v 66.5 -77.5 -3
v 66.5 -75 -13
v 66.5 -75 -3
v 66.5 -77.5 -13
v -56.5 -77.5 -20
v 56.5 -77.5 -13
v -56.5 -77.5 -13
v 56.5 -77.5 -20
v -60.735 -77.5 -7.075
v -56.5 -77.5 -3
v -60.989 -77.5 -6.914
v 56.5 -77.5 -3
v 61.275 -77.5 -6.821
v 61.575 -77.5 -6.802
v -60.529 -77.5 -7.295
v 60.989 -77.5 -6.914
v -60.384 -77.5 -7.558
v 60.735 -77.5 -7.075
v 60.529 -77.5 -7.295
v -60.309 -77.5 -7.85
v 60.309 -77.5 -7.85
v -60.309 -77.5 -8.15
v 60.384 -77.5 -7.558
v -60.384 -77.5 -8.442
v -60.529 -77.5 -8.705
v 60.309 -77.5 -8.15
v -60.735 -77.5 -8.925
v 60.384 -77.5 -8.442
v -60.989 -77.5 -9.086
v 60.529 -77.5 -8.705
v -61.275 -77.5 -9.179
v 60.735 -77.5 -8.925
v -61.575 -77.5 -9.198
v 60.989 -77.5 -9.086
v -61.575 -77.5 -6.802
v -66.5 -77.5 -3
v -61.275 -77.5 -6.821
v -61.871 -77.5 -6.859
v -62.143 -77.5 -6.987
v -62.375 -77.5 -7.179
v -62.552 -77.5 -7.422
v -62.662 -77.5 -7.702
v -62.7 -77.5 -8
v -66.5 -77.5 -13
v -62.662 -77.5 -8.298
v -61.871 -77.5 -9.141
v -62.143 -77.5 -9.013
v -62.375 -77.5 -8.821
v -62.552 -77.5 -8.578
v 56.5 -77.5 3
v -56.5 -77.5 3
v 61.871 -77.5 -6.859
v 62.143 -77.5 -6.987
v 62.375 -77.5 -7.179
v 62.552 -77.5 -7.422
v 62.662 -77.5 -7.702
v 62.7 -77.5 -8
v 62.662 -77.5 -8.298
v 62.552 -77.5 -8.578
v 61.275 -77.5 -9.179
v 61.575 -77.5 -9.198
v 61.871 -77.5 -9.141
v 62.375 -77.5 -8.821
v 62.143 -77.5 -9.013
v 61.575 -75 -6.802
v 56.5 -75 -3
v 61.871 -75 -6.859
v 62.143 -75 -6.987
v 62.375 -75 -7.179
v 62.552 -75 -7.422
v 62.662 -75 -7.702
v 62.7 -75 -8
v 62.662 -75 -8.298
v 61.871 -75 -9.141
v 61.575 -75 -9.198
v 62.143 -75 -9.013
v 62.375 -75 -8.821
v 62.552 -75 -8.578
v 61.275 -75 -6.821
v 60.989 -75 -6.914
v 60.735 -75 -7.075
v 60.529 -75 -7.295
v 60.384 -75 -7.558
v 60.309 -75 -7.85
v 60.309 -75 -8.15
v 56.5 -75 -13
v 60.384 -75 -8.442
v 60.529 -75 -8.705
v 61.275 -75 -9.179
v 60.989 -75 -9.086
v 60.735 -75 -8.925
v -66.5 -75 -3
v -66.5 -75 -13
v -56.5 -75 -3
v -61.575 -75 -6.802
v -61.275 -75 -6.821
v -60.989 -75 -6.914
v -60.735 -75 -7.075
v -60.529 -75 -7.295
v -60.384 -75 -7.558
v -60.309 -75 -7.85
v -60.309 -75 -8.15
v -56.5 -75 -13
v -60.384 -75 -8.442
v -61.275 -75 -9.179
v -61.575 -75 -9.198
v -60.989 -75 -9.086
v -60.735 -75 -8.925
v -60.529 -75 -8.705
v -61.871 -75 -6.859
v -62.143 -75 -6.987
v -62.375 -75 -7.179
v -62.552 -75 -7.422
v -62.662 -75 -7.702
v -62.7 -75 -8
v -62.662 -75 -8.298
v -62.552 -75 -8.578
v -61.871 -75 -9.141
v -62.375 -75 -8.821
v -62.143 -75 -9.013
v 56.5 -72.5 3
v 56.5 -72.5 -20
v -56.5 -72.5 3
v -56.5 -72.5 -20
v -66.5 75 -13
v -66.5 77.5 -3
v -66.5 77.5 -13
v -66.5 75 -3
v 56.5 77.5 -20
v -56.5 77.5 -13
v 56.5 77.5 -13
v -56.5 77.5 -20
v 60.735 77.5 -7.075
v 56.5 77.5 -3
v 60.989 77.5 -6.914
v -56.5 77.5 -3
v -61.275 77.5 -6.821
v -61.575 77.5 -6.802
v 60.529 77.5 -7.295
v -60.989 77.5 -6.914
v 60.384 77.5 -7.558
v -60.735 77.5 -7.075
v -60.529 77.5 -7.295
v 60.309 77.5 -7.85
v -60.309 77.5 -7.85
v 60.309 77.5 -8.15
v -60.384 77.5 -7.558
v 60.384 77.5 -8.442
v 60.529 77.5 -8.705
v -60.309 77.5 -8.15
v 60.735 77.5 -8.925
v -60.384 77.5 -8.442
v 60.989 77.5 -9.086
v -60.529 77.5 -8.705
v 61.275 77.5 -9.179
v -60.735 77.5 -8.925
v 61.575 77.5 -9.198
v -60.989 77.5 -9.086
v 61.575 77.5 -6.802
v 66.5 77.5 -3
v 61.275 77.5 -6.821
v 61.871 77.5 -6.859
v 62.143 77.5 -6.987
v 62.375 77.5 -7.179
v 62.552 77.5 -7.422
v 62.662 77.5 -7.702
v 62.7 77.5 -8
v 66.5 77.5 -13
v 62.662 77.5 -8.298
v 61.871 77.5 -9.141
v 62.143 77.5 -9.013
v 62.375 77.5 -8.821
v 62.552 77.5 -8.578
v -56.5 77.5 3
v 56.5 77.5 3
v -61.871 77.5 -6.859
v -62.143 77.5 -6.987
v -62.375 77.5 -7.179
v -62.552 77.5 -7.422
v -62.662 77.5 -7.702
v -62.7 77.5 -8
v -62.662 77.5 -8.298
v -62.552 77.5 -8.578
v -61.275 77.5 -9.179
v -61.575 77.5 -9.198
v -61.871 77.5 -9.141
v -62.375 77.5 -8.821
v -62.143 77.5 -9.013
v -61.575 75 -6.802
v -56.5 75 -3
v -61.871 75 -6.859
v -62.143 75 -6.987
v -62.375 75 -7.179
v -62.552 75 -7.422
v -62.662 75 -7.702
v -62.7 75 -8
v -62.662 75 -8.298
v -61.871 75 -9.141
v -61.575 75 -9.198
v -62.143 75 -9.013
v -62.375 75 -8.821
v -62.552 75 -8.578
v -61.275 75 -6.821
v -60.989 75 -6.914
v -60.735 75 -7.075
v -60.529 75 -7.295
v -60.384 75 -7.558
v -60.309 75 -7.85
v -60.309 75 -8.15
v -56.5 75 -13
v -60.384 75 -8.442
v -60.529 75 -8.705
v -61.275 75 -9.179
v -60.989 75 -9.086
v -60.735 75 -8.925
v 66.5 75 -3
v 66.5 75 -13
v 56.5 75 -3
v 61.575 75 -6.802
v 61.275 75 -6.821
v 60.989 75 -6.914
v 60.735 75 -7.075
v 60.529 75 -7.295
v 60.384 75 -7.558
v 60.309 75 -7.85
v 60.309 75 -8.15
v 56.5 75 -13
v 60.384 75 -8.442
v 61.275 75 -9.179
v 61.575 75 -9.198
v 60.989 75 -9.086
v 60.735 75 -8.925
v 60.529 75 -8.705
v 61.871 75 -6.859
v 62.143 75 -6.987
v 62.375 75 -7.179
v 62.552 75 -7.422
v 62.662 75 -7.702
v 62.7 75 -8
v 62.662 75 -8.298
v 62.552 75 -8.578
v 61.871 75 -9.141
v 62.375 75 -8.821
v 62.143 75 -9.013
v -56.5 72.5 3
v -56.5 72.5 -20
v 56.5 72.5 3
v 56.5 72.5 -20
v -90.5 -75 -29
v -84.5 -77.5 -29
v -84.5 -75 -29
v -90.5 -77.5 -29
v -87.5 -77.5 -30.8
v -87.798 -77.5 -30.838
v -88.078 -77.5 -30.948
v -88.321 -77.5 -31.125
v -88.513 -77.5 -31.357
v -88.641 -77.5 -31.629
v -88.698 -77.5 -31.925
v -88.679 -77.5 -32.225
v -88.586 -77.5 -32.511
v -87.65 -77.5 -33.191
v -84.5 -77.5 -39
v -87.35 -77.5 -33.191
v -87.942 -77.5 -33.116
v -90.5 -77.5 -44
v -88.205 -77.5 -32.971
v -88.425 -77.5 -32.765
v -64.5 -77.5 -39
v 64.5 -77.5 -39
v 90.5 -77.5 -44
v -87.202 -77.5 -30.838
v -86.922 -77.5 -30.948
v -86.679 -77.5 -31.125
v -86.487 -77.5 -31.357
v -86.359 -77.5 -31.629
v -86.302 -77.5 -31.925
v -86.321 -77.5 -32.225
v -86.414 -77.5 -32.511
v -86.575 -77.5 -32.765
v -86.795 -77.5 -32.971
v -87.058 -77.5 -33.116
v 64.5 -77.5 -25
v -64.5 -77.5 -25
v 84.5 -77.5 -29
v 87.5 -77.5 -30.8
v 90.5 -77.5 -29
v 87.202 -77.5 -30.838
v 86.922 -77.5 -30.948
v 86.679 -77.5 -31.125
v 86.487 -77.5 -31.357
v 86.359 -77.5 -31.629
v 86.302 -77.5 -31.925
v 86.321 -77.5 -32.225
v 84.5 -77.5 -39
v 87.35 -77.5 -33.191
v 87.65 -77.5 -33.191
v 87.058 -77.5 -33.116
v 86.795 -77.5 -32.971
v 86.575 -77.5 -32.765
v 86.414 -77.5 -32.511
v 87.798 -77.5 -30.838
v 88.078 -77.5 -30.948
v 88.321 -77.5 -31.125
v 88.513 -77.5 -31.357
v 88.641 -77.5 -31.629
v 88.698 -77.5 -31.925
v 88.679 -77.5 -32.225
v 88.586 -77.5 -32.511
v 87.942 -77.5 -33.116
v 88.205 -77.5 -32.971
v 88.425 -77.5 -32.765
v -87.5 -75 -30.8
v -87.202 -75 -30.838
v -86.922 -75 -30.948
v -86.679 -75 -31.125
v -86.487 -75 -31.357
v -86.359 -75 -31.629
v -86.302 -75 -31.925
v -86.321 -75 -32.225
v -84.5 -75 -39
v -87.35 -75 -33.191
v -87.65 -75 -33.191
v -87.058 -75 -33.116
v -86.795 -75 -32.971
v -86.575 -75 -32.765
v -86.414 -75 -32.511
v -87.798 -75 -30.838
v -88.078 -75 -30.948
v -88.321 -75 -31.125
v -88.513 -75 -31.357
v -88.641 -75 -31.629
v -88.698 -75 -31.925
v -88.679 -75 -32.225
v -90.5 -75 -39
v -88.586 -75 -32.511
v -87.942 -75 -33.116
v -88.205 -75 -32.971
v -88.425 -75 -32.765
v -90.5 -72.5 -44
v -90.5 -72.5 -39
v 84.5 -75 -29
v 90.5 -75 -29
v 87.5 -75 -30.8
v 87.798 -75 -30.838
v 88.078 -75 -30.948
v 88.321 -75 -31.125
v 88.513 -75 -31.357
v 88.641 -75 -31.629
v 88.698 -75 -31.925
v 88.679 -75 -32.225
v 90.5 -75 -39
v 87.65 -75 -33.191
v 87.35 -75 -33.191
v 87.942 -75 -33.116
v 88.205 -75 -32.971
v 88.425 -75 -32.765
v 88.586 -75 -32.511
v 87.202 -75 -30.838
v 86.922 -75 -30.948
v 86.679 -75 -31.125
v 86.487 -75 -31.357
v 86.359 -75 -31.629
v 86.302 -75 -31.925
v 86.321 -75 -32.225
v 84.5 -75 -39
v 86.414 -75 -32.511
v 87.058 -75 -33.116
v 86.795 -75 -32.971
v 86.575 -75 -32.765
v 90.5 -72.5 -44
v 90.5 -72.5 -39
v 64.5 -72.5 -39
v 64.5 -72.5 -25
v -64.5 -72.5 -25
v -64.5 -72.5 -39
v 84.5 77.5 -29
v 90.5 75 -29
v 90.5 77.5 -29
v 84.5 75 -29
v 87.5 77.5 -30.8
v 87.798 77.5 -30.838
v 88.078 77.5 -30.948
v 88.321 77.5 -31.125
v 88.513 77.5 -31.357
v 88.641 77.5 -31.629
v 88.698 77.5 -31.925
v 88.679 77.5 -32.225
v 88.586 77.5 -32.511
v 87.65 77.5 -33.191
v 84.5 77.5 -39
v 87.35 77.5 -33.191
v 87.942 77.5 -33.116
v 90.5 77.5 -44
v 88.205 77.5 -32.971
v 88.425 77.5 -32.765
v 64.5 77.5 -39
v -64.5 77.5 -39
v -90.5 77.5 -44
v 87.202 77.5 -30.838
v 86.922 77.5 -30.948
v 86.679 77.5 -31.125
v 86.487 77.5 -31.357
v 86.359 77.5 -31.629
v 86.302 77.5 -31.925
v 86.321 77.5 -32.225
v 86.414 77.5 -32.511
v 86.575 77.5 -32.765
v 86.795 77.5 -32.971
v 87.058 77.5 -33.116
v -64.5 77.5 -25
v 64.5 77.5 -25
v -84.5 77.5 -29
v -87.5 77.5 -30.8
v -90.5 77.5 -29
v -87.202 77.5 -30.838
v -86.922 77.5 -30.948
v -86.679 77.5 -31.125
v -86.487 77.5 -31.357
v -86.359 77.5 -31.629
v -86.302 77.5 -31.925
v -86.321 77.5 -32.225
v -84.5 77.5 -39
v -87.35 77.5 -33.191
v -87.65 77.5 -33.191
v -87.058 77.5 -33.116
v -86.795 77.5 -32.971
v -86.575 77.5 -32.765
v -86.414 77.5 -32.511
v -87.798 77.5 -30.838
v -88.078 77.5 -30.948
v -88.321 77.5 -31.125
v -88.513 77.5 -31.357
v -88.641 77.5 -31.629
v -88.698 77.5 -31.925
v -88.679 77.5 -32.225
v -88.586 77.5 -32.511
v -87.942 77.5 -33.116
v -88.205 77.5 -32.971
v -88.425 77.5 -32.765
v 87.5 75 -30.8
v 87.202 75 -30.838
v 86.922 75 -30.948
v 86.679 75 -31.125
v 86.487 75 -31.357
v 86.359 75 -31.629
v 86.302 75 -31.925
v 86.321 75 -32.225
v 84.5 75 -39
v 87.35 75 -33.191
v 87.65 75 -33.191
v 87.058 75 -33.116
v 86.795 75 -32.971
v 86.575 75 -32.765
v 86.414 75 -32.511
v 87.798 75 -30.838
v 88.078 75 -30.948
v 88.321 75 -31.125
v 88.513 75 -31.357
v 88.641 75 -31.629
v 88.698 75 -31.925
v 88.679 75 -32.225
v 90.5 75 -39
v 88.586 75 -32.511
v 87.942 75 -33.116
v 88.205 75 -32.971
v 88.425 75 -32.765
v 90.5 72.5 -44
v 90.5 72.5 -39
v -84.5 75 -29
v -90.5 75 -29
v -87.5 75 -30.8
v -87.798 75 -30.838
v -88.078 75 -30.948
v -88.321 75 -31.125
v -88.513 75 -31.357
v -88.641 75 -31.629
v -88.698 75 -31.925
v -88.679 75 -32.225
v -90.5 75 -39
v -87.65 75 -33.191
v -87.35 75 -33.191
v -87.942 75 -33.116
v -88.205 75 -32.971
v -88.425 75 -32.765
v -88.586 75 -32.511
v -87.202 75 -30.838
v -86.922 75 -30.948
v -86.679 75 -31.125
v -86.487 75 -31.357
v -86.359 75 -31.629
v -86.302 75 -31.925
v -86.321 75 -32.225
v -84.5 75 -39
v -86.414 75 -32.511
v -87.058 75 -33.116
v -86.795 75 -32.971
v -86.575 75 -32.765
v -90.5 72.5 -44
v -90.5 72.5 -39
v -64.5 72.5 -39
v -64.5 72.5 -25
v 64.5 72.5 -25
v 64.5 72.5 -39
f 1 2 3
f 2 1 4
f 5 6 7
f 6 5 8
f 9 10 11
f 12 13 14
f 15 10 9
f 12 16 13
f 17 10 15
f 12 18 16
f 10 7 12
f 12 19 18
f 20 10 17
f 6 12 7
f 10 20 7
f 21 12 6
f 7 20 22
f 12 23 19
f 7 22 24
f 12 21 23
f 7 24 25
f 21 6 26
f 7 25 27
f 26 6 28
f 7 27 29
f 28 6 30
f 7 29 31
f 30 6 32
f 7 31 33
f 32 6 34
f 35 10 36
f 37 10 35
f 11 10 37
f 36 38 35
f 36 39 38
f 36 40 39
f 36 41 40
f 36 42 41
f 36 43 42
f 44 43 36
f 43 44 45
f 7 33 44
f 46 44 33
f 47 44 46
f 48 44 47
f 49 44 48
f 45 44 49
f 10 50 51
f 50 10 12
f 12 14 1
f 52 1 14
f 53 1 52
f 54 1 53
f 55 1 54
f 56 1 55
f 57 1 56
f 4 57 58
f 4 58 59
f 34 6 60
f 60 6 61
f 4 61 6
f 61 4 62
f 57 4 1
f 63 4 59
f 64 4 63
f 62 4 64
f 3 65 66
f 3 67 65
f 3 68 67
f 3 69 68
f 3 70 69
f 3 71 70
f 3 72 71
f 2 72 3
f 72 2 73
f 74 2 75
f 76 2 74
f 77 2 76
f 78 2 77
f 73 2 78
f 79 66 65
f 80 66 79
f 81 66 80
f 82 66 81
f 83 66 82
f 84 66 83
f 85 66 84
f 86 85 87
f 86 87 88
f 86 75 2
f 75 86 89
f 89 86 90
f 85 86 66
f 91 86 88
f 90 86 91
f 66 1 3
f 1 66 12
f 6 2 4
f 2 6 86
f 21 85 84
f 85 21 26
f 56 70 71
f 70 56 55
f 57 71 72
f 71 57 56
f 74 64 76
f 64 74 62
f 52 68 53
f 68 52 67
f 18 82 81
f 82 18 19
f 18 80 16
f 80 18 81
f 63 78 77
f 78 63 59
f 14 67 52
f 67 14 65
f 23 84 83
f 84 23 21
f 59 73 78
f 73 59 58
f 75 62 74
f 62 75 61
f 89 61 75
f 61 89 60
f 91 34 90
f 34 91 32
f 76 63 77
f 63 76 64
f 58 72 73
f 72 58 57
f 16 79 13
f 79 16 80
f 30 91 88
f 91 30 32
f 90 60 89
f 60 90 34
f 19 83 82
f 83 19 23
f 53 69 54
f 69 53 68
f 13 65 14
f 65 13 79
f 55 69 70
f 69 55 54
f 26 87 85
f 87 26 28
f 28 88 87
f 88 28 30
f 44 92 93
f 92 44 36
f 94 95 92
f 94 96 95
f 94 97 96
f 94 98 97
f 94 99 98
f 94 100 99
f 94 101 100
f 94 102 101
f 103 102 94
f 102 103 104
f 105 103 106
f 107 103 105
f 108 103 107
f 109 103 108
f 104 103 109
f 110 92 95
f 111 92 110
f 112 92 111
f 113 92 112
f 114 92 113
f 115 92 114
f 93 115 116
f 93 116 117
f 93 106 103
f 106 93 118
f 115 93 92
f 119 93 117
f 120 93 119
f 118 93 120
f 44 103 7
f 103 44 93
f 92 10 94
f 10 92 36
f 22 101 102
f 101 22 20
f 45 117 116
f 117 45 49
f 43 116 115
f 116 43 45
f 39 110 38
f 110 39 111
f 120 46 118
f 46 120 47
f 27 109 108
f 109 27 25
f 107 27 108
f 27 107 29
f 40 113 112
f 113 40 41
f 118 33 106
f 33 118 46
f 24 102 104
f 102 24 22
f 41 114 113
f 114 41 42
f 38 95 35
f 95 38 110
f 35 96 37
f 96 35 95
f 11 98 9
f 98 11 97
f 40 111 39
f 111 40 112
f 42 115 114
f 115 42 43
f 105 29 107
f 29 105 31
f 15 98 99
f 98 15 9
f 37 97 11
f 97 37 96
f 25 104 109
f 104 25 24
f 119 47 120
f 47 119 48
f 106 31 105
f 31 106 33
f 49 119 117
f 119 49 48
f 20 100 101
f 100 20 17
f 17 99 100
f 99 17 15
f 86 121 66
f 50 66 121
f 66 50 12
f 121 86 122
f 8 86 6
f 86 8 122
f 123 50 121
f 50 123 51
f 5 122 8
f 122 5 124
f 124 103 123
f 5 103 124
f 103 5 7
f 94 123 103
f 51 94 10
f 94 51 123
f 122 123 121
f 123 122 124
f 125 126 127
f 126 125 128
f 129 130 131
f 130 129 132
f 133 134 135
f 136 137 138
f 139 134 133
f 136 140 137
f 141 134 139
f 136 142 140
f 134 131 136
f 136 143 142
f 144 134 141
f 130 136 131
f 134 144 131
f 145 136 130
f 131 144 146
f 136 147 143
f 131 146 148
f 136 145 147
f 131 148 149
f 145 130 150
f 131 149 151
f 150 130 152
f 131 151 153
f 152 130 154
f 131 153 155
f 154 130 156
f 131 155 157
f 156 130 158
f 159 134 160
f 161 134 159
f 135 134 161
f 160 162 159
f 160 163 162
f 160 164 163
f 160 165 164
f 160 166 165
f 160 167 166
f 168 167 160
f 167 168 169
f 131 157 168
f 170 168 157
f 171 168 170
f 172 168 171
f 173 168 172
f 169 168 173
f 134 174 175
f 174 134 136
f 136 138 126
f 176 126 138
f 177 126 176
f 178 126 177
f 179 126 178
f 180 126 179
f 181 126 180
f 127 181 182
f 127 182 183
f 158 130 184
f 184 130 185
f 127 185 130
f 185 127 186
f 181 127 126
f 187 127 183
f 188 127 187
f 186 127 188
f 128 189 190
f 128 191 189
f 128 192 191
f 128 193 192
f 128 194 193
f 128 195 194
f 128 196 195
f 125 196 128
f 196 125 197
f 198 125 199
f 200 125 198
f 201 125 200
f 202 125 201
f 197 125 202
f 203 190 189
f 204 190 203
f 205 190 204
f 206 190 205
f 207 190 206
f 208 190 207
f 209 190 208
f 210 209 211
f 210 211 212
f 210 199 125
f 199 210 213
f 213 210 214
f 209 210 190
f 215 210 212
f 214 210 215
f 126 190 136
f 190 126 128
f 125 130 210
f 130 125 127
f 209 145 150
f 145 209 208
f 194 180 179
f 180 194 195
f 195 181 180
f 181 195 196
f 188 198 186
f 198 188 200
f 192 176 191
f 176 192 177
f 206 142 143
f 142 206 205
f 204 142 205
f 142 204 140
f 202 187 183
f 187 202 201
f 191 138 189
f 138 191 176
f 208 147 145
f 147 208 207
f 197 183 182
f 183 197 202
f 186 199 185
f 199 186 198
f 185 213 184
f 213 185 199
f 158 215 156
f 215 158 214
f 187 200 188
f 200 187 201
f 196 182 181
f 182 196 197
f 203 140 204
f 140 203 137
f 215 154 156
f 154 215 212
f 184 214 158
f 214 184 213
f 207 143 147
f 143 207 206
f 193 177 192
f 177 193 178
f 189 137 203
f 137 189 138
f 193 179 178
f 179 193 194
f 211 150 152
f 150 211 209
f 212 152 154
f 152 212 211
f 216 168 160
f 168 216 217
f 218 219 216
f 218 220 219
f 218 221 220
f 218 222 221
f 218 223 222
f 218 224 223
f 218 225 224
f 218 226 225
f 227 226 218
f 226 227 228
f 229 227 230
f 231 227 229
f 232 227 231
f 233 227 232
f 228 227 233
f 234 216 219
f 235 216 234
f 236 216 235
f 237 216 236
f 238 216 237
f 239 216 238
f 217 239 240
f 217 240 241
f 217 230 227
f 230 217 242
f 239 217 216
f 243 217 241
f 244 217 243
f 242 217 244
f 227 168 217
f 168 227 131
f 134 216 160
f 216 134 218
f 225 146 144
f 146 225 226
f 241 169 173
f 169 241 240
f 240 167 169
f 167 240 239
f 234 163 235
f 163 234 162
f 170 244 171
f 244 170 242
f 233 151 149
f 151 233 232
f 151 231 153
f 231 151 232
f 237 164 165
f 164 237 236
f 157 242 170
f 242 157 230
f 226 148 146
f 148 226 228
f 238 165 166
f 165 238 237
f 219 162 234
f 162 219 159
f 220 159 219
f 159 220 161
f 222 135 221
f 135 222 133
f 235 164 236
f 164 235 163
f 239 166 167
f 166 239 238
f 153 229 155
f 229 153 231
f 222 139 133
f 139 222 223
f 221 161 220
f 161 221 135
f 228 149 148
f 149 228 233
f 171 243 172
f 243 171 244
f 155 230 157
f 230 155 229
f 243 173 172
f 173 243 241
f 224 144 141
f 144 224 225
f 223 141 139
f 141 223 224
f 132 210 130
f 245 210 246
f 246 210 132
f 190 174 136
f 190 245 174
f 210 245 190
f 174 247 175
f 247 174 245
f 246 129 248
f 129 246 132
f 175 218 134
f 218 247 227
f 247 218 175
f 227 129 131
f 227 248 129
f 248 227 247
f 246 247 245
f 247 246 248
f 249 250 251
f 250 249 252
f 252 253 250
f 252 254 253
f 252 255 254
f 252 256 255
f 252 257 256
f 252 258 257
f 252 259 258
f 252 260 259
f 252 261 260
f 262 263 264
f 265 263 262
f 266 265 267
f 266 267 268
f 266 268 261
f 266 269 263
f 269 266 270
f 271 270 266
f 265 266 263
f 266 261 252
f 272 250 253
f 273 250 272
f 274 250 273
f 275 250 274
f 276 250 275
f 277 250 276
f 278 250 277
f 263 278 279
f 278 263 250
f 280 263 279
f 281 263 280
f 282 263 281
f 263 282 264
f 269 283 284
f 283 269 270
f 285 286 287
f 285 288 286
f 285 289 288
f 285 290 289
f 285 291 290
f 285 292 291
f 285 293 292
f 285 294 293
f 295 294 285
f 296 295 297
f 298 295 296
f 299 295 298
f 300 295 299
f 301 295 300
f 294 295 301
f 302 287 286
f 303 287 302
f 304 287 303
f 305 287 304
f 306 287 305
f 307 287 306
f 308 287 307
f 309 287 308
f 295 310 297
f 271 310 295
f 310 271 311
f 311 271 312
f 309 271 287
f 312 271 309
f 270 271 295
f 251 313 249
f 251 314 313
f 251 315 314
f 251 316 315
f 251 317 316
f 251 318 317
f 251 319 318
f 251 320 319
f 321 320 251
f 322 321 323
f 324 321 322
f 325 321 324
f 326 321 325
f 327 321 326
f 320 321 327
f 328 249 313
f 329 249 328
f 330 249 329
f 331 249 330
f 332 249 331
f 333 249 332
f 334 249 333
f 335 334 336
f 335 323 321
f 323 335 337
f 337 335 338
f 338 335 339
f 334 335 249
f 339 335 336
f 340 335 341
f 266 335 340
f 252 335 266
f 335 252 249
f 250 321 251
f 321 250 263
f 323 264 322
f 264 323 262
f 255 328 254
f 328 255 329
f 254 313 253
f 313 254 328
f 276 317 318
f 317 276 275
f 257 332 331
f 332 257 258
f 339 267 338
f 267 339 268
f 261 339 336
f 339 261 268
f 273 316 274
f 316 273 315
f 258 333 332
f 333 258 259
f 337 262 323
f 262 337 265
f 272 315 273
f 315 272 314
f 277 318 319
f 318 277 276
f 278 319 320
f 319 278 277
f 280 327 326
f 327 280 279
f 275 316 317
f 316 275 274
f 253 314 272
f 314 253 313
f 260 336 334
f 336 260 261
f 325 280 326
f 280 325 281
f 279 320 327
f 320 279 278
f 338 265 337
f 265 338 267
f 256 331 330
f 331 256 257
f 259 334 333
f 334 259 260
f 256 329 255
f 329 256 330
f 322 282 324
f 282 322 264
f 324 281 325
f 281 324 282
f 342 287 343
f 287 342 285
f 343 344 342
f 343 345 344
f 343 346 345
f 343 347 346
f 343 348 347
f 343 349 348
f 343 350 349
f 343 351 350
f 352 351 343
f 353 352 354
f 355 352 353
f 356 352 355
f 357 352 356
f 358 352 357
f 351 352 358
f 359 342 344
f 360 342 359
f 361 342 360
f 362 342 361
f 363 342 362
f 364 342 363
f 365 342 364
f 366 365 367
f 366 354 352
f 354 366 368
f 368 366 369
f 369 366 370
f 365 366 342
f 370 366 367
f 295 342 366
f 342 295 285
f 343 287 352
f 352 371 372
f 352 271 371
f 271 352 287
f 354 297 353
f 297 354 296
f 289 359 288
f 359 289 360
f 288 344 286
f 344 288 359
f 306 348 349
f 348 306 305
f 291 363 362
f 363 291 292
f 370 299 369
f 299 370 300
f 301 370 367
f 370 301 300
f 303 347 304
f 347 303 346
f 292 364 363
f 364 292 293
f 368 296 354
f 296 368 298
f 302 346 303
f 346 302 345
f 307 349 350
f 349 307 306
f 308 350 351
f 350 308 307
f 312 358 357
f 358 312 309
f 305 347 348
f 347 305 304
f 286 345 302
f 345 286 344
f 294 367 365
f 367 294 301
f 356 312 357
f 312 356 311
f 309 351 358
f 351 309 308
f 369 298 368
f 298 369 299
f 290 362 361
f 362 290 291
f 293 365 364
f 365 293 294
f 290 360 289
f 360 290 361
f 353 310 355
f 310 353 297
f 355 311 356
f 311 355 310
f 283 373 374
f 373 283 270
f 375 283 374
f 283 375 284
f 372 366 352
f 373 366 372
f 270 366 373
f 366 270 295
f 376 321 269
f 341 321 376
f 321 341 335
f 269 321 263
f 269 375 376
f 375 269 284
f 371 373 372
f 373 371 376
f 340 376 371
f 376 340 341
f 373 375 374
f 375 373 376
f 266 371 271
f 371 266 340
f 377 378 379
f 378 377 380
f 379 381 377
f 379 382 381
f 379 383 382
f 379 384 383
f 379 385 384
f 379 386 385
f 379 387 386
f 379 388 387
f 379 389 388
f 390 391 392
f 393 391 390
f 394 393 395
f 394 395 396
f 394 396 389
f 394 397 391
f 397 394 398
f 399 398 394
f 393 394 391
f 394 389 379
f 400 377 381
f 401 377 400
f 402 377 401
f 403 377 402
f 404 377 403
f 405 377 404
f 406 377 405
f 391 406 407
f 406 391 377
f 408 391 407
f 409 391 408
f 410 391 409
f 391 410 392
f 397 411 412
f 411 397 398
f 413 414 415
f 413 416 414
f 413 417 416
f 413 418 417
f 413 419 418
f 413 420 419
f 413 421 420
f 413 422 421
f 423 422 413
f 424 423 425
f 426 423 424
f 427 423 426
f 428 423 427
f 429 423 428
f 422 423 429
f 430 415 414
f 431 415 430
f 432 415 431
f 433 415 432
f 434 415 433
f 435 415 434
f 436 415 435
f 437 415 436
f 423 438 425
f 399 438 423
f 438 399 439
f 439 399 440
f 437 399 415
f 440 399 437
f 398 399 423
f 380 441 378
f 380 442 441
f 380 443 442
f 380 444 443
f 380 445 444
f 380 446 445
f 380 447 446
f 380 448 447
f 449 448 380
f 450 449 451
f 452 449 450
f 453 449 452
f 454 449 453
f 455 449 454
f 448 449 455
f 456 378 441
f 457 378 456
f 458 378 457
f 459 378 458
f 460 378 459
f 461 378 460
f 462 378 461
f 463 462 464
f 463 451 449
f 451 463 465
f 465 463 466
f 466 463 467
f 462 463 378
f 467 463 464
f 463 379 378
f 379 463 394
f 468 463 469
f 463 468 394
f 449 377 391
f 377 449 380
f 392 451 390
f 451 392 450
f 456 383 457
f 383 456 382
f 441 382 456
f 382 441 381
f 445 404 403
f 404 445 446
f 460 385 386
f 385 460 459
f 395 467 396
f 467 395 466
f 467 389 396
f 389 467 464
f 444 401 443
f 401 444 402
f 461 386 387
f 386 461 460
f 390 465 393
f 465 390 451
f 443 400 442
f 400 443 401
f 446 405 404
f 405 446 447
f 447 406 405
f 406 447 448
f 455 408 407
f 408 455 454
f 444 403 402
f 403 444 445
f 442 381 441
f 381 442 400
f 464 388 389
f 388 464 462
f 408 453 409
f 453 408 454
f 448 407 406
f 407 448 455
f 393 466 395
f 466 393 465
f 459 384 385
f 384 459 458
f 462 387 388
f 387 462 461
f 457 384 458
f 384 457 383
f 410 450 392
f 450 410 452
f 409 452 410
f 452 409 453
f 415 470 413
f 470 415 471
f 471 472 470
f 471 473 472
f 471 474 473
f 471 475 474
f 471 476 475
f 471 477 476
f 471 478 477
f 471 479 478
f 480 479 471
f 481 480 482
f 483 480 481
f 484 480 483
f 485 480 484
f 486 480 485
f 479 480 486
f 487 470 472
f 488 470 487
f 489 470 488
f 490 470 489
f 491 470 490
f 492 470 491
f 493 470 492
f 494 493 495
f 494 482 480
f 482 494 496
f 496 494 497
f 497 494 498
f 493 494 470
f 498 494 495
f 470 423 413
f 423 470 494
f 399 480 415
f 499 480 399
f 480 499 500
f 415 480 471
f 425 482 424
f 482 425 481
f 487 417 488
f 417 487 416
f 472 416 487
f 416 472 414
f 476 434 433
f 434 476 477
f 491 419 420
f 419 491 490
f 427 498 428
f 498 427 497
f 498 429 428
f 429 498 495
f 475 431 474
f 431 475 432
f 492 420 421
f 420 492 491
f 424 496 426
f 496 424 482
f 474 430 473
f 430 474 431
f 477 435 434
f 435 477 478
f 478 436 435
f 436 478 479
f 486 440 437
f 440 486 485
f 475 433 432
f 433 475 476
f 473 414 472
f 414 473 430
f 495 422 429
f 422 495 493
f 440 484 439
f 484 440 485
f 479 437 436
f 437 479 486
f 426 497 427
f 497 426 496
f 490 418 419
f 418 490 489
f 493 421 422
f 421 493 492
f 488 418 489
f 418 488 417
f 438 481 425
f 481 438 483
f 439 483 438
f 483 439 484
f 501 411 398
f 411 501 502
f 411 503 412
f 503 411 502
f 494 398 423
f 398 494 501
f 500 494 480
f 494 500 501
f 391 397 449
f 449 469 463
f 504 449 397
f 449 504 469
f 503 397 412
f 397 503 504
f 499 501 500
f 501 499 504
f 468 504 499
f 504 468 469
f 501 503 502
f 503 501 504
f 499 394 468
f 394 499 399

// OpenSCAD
// file: Rig.scad
// Roller Project Part #1 Front Bracket
include <../Settings.scad>;

rig();




module rig(){
//plate
translate( v= [-PlateWidth/2,-PlateDepth/2,-PlateHeight]){
	color("Silver") cube(size=[PlateWidth,PlateDepth,PlateHeight]);
}

//arm
translate( v= [-BaseWidth/2-ArmWidth,-PlateDepth/2-ArmForwardProjection,-ArmVOffset-ArmHeight]){
	color("DimGray") cube(size=[ArmWidth,PlateDepth+ArmForwardProjection+ArmRearProjection,ArmHeight]);
}

//arm
translate( v= [BaseWidth/2,-PlateDepth/2-ArmForwardProjection,-ArmVOffset-ArmHeight]){
	color("DimGray")  cube(size=[ArmWidth,PlateDepth+ArmForwardProjection+ArmRearProjection,ArmHeight]);
}

//base
translate( v= [-BaseWidth/2,-PlateDepth/2-BaseForwardProjection,-BaseVOffset-BaseHeight]){
	color("Gainsboro") cube (size=[BaseWidth,PlateDepth+BaseForwardProjection+BaseRearProjection,BaseHeight]);
}

color("Gainsboro")RigLogoPlate();

translate(v= [ScrewsWidthOutset,ScrewsDepthOutset,-(BaseVOffset+BaseHeight+ScrewsHeadProtrusion)])
color("SlateGray") RigScrew();

translate(v= [-ScrewsWidthOutset,ScrewsDepthOutset,-(BaseVOffset+BaseHeight+ScrewsHeadProtrusion)])
color("SlateGray") RigScrew();

translate(v= [ScrewsWidthOutset,-ScrewsDepthOutset,-(BaseVOffset+BaseHeight+ScrewsHeadProtrusion)])
color("SlateGray") RigScrew();

translate(v= [-ScrewsWidthOutset,-ScrewsDepthOutset,-(BaseVOffset+BaseHeight+ScrewsHeadProtrusion)])
color("SlateGray") RigScrew();


}



module RigScrew(){
	cylinder(h=ScrewsHeadHeight, r=ScrewsHeadRadius );
	cylinder(h=ScrewsHeadHeight, r=ScrewsHeadRadius );
	translate(v = [0,0,-d]){
		cylinder(h=BaseVOffset+BaseHeight+ScrewsHeadProtrusion-d, r=ScrewsShaftRadius );
	}
}



module RigLogoPlate(){
translate( v= [0,-PlateDepth/2-BaseForwardProjection,-BaseVOffset])
rotate(v= [1,0,0], a=BaseDeflectorAngle )
	translate(v=[-BaseWidth/2,-BaseDeflectorLength,-BaseHeight])
		cube(size=[BaseWidth,BaseDeflectorLength,BaseHeight]);


}
// file: Connector.scad
include <../Settings.scad>;

ConnectorDefaults_Length = 8;
ConnectorDefaults_Width = 6;
ConnectorDefaults_Thickness = 5;
ConnectorDefaults_HoleRadius = 1;
ConnectorDefaults_SlipRadius = 0.2; // Radius increase in clip to allow thread to slip

ConnectorTest();

module Clip(
Length =ConnectorDefaults_Length,
Width = ConnectorDefaults_Width,
Thickness = ConnectorDefaults_Thickness,
HoleRadius = ConnectorDefaults_HoleRadius,
SlipRadius = ConnectorDefaults_SlipRadius){
	translate(v = [0,-Width/2,Thickness/2])
		difference(){
			translate(v = [-d,0,0]){
				cube(size=[Length+d,Width,Thickness/2]);
			}
			translate(v = [Length-(Width/2),Width/2,-d])
				color("blue")cylinder(h=Thickness+2*d,r= HoleRadius+SlipRadius, $fn =25);
		}
}

module ClipHole(
Length =ConnectorDefaults_Length,
Width = ConnectorDefaults_Width,
Thickness = ConnectorDefaults_Thickness,
HoleRadius = ConnectorDefaults_HoleRadius){
translate(v = [0,-Width/2,Thickness/2])
	union(){
		translate(v = [-d,0,0])
			cube(size=[Length+d,Width,Thickness/2+d]);
		translate(v = [Length-(Width/2),Width/2,(-Thickness/2)-d])
			color("red")cylinder(h=Thickness+2*d,r= HoleRadius, $fn =25);
	}
}





module ConnectorTest(){

	translate(v = [0,20,0])
		ClipHole();

	translate(v = [0,40,0])
		Clip();

	%color("green") difference(){
		union(){
			difference(){
				translate(v = [-5,-10,0])
					cube(size = [30,20,5]);
			
				translate(v = [0,0,0])
					ClipHole();
			}
		}
		translate(v = [-6,-22,-1])
			color("green") cube(size = [32,22,7]);
	}

	difference(){
		translate(v = [0,0,0])
			color("red") Clip();
		translate(v = [-6,-22,-1])
			color("red") cube(size = [32,22,7]);
	}
}
// file: ../Settings.scad
// Mesurements Of Platform Actual & Global Settings
// Mesurements ACTUAL
PlateWidth = 228;
PlateDepth = 145;
PlateHeight = 5;

ArmWidth = 20;
ArmHeight = 24;
ArmForwardProjection = 25;
ArmRearProjection = 50;
ArmVOffset = 15;

BaseWidth = 129;
BaseHeight = 5;
BaseForwardProjection = 10;
BaseRearProjection = 10;
BaseVOffset = 20;

BaseDeflectorLength = 20;
BaseDeflectorAngle = 45;

ScrewsWidthOutset = 35;
ScrewsDepthOutset = 35;
ScrewsHeadRadius = 10;
ScrewsHeadHeight = 2;
ScrewsHeadProtrusion = 5;
ScrewsShaftRadius = 2;
ScrewsHeadCutoutRadius = 2;

RearPlugWidth = 10;
RearPlugHeight = 5;
RearPlugVOffset = 1;

// Options
// ****************************************************************************************************

d = 0.08;   //Delta

ClipSticksize = 8;
PlateThickness = 5;

TensionerBearingRadius = 2;
TensionerOffsetRadius = 15;
TensionerAngle = 45;
TensionerBearingExtention = 3;
TensionerInset = 2;

//lips to keep the belt in
Lip = 3;
//TopLip = 500;
BottomLip = 5;

MidPlateOverlap = 20;
MidPlateOverlapHeight = 10;
MidPlateOverlapOffset = 7;
ClipHoleSize = 5;

LowerPlateCrossover =10;

RollerCore = 2;
RollerClearance = 2;
RollerLength = PlateDepth - 2*RollerClearance;

UpperRollerProjection  = 40;
UpperRollerRadius = 8;

LowerRollerProjection = 20;
LowerRollerRadius = 6;

RollerBearingCutoutRadius = 3;

IbeamProjection = 15;
IbeamPlateThikness = 6;


// Calculated
// ************************************************************************************************************
PlateX = BaseWidth/2;

RollerLength = PlateDepth - 2*RollerClearance;
PlateArmOverhang = PlateWidth/2 - BaseWidth/2  - ArmWidth; 

UpperRollerPlateX = ArmWidth+PlateArmOverhang+UpperRollerProjection-UpperRollerRadius;
UpperRollerPlateY = -UpperRollerRadius; 

LowerRollerPlateX = ArmWidth+PlateArmOverhang+LowerRollerProjection-LowerRollerRadius;
LowerRollerPlateY = -(ArmVOffset+ArmHeight)+LowerRollerRadius;
// main file
// Front plate
include <../Settings.scad>;
use <Connector.scad>;
use <Rig.scad>;



%rig();
translate(v = [0,-PlateDepth/2]) FrontPlate();
translate(v = [0,PlateDepth/2]) BackPlate();
translate(v = [0,-PlateDepth/2]) LowerFrontPlate();
translate(v = [0,PlateDepth/2]) LowerRearPlate();

module LowerRearPlate(){
	rotate(v =[0,0,1], a= 180)
	LowerFrontPlate();
}


module LowerFrontPlate(){
	translate(v=[-(BaseWidth/2),-PlateThickness,-ArmVOffset-ArmHeight])
		color("Blue") cube(size=[BaseWidth,PlateThickness,ArmVOffset+ArmHeight-BaseVOffset-BaseHeight]);

	translate(v=[-(BaseWidth/2+(ArmWidth+6)),-PlateThickness,-ArmVOffset-ArmHeight-BottomLip])
		color("SteelBlue") cube(size=[BaseWidth+2*(ArmWidth+6),PlateThickness,BottomLip]);

	translate(v=[-(BaseWidth/2)-(ArmWidth+6)+3,0,-ArmVOffset-ArmHeight])
		rotate(v =[1,0,0], a= 90)
			rotate(v =[0,0,1], a= 90)
      				color("green") Clip(Thickness=PlateThickness,Length= 10);

	translate(v=[(BaseWidth/2)+(ArmWidth+6)-3,0,-ArmVOffset-ArmHeight])
		rotate(v =[1,0,0], a= 90)
			rotate(v =[0,0,1], a= 90)
      				color("red") Clip(Thickness=PlateThickness,Length= 10);
}


module BackPlate(){
	rotate(v =[0,0,1], a= 180)
	FrontPlate();
}

module FrontPlate(){
	union(){
	translate(v=[-(BaseWidth/2)+ClipSticksize,-PlateThickness,-BaseVOffset])
	color("SteelBlue") cube(size=[BaseWidth-2*ClipSticksize,PlateThickness,BaseVOffset+Lip]);

	translate(v=[BaseWidth/2-ClipSticksize,0,-ArmVOffset+MidPlateOverlapOffset])
		rotate(v =[1,0,0], a= 90)
      			color("red") Clip(Thickness=PlateThickness, Width = 10,Length = 10);

	translate(v=[-(BaseWidth/2-ClipSticksize),0,-ArmVOffset+MidPlateOverlapOffset])
		rotate(v =[1,0,0], a= 90)
			rotate(v =[0,0,1], a= 180)
      			color("green") Clip(Thickness=PlateThickness,Width = 10, Length = 10);
	} 
}
